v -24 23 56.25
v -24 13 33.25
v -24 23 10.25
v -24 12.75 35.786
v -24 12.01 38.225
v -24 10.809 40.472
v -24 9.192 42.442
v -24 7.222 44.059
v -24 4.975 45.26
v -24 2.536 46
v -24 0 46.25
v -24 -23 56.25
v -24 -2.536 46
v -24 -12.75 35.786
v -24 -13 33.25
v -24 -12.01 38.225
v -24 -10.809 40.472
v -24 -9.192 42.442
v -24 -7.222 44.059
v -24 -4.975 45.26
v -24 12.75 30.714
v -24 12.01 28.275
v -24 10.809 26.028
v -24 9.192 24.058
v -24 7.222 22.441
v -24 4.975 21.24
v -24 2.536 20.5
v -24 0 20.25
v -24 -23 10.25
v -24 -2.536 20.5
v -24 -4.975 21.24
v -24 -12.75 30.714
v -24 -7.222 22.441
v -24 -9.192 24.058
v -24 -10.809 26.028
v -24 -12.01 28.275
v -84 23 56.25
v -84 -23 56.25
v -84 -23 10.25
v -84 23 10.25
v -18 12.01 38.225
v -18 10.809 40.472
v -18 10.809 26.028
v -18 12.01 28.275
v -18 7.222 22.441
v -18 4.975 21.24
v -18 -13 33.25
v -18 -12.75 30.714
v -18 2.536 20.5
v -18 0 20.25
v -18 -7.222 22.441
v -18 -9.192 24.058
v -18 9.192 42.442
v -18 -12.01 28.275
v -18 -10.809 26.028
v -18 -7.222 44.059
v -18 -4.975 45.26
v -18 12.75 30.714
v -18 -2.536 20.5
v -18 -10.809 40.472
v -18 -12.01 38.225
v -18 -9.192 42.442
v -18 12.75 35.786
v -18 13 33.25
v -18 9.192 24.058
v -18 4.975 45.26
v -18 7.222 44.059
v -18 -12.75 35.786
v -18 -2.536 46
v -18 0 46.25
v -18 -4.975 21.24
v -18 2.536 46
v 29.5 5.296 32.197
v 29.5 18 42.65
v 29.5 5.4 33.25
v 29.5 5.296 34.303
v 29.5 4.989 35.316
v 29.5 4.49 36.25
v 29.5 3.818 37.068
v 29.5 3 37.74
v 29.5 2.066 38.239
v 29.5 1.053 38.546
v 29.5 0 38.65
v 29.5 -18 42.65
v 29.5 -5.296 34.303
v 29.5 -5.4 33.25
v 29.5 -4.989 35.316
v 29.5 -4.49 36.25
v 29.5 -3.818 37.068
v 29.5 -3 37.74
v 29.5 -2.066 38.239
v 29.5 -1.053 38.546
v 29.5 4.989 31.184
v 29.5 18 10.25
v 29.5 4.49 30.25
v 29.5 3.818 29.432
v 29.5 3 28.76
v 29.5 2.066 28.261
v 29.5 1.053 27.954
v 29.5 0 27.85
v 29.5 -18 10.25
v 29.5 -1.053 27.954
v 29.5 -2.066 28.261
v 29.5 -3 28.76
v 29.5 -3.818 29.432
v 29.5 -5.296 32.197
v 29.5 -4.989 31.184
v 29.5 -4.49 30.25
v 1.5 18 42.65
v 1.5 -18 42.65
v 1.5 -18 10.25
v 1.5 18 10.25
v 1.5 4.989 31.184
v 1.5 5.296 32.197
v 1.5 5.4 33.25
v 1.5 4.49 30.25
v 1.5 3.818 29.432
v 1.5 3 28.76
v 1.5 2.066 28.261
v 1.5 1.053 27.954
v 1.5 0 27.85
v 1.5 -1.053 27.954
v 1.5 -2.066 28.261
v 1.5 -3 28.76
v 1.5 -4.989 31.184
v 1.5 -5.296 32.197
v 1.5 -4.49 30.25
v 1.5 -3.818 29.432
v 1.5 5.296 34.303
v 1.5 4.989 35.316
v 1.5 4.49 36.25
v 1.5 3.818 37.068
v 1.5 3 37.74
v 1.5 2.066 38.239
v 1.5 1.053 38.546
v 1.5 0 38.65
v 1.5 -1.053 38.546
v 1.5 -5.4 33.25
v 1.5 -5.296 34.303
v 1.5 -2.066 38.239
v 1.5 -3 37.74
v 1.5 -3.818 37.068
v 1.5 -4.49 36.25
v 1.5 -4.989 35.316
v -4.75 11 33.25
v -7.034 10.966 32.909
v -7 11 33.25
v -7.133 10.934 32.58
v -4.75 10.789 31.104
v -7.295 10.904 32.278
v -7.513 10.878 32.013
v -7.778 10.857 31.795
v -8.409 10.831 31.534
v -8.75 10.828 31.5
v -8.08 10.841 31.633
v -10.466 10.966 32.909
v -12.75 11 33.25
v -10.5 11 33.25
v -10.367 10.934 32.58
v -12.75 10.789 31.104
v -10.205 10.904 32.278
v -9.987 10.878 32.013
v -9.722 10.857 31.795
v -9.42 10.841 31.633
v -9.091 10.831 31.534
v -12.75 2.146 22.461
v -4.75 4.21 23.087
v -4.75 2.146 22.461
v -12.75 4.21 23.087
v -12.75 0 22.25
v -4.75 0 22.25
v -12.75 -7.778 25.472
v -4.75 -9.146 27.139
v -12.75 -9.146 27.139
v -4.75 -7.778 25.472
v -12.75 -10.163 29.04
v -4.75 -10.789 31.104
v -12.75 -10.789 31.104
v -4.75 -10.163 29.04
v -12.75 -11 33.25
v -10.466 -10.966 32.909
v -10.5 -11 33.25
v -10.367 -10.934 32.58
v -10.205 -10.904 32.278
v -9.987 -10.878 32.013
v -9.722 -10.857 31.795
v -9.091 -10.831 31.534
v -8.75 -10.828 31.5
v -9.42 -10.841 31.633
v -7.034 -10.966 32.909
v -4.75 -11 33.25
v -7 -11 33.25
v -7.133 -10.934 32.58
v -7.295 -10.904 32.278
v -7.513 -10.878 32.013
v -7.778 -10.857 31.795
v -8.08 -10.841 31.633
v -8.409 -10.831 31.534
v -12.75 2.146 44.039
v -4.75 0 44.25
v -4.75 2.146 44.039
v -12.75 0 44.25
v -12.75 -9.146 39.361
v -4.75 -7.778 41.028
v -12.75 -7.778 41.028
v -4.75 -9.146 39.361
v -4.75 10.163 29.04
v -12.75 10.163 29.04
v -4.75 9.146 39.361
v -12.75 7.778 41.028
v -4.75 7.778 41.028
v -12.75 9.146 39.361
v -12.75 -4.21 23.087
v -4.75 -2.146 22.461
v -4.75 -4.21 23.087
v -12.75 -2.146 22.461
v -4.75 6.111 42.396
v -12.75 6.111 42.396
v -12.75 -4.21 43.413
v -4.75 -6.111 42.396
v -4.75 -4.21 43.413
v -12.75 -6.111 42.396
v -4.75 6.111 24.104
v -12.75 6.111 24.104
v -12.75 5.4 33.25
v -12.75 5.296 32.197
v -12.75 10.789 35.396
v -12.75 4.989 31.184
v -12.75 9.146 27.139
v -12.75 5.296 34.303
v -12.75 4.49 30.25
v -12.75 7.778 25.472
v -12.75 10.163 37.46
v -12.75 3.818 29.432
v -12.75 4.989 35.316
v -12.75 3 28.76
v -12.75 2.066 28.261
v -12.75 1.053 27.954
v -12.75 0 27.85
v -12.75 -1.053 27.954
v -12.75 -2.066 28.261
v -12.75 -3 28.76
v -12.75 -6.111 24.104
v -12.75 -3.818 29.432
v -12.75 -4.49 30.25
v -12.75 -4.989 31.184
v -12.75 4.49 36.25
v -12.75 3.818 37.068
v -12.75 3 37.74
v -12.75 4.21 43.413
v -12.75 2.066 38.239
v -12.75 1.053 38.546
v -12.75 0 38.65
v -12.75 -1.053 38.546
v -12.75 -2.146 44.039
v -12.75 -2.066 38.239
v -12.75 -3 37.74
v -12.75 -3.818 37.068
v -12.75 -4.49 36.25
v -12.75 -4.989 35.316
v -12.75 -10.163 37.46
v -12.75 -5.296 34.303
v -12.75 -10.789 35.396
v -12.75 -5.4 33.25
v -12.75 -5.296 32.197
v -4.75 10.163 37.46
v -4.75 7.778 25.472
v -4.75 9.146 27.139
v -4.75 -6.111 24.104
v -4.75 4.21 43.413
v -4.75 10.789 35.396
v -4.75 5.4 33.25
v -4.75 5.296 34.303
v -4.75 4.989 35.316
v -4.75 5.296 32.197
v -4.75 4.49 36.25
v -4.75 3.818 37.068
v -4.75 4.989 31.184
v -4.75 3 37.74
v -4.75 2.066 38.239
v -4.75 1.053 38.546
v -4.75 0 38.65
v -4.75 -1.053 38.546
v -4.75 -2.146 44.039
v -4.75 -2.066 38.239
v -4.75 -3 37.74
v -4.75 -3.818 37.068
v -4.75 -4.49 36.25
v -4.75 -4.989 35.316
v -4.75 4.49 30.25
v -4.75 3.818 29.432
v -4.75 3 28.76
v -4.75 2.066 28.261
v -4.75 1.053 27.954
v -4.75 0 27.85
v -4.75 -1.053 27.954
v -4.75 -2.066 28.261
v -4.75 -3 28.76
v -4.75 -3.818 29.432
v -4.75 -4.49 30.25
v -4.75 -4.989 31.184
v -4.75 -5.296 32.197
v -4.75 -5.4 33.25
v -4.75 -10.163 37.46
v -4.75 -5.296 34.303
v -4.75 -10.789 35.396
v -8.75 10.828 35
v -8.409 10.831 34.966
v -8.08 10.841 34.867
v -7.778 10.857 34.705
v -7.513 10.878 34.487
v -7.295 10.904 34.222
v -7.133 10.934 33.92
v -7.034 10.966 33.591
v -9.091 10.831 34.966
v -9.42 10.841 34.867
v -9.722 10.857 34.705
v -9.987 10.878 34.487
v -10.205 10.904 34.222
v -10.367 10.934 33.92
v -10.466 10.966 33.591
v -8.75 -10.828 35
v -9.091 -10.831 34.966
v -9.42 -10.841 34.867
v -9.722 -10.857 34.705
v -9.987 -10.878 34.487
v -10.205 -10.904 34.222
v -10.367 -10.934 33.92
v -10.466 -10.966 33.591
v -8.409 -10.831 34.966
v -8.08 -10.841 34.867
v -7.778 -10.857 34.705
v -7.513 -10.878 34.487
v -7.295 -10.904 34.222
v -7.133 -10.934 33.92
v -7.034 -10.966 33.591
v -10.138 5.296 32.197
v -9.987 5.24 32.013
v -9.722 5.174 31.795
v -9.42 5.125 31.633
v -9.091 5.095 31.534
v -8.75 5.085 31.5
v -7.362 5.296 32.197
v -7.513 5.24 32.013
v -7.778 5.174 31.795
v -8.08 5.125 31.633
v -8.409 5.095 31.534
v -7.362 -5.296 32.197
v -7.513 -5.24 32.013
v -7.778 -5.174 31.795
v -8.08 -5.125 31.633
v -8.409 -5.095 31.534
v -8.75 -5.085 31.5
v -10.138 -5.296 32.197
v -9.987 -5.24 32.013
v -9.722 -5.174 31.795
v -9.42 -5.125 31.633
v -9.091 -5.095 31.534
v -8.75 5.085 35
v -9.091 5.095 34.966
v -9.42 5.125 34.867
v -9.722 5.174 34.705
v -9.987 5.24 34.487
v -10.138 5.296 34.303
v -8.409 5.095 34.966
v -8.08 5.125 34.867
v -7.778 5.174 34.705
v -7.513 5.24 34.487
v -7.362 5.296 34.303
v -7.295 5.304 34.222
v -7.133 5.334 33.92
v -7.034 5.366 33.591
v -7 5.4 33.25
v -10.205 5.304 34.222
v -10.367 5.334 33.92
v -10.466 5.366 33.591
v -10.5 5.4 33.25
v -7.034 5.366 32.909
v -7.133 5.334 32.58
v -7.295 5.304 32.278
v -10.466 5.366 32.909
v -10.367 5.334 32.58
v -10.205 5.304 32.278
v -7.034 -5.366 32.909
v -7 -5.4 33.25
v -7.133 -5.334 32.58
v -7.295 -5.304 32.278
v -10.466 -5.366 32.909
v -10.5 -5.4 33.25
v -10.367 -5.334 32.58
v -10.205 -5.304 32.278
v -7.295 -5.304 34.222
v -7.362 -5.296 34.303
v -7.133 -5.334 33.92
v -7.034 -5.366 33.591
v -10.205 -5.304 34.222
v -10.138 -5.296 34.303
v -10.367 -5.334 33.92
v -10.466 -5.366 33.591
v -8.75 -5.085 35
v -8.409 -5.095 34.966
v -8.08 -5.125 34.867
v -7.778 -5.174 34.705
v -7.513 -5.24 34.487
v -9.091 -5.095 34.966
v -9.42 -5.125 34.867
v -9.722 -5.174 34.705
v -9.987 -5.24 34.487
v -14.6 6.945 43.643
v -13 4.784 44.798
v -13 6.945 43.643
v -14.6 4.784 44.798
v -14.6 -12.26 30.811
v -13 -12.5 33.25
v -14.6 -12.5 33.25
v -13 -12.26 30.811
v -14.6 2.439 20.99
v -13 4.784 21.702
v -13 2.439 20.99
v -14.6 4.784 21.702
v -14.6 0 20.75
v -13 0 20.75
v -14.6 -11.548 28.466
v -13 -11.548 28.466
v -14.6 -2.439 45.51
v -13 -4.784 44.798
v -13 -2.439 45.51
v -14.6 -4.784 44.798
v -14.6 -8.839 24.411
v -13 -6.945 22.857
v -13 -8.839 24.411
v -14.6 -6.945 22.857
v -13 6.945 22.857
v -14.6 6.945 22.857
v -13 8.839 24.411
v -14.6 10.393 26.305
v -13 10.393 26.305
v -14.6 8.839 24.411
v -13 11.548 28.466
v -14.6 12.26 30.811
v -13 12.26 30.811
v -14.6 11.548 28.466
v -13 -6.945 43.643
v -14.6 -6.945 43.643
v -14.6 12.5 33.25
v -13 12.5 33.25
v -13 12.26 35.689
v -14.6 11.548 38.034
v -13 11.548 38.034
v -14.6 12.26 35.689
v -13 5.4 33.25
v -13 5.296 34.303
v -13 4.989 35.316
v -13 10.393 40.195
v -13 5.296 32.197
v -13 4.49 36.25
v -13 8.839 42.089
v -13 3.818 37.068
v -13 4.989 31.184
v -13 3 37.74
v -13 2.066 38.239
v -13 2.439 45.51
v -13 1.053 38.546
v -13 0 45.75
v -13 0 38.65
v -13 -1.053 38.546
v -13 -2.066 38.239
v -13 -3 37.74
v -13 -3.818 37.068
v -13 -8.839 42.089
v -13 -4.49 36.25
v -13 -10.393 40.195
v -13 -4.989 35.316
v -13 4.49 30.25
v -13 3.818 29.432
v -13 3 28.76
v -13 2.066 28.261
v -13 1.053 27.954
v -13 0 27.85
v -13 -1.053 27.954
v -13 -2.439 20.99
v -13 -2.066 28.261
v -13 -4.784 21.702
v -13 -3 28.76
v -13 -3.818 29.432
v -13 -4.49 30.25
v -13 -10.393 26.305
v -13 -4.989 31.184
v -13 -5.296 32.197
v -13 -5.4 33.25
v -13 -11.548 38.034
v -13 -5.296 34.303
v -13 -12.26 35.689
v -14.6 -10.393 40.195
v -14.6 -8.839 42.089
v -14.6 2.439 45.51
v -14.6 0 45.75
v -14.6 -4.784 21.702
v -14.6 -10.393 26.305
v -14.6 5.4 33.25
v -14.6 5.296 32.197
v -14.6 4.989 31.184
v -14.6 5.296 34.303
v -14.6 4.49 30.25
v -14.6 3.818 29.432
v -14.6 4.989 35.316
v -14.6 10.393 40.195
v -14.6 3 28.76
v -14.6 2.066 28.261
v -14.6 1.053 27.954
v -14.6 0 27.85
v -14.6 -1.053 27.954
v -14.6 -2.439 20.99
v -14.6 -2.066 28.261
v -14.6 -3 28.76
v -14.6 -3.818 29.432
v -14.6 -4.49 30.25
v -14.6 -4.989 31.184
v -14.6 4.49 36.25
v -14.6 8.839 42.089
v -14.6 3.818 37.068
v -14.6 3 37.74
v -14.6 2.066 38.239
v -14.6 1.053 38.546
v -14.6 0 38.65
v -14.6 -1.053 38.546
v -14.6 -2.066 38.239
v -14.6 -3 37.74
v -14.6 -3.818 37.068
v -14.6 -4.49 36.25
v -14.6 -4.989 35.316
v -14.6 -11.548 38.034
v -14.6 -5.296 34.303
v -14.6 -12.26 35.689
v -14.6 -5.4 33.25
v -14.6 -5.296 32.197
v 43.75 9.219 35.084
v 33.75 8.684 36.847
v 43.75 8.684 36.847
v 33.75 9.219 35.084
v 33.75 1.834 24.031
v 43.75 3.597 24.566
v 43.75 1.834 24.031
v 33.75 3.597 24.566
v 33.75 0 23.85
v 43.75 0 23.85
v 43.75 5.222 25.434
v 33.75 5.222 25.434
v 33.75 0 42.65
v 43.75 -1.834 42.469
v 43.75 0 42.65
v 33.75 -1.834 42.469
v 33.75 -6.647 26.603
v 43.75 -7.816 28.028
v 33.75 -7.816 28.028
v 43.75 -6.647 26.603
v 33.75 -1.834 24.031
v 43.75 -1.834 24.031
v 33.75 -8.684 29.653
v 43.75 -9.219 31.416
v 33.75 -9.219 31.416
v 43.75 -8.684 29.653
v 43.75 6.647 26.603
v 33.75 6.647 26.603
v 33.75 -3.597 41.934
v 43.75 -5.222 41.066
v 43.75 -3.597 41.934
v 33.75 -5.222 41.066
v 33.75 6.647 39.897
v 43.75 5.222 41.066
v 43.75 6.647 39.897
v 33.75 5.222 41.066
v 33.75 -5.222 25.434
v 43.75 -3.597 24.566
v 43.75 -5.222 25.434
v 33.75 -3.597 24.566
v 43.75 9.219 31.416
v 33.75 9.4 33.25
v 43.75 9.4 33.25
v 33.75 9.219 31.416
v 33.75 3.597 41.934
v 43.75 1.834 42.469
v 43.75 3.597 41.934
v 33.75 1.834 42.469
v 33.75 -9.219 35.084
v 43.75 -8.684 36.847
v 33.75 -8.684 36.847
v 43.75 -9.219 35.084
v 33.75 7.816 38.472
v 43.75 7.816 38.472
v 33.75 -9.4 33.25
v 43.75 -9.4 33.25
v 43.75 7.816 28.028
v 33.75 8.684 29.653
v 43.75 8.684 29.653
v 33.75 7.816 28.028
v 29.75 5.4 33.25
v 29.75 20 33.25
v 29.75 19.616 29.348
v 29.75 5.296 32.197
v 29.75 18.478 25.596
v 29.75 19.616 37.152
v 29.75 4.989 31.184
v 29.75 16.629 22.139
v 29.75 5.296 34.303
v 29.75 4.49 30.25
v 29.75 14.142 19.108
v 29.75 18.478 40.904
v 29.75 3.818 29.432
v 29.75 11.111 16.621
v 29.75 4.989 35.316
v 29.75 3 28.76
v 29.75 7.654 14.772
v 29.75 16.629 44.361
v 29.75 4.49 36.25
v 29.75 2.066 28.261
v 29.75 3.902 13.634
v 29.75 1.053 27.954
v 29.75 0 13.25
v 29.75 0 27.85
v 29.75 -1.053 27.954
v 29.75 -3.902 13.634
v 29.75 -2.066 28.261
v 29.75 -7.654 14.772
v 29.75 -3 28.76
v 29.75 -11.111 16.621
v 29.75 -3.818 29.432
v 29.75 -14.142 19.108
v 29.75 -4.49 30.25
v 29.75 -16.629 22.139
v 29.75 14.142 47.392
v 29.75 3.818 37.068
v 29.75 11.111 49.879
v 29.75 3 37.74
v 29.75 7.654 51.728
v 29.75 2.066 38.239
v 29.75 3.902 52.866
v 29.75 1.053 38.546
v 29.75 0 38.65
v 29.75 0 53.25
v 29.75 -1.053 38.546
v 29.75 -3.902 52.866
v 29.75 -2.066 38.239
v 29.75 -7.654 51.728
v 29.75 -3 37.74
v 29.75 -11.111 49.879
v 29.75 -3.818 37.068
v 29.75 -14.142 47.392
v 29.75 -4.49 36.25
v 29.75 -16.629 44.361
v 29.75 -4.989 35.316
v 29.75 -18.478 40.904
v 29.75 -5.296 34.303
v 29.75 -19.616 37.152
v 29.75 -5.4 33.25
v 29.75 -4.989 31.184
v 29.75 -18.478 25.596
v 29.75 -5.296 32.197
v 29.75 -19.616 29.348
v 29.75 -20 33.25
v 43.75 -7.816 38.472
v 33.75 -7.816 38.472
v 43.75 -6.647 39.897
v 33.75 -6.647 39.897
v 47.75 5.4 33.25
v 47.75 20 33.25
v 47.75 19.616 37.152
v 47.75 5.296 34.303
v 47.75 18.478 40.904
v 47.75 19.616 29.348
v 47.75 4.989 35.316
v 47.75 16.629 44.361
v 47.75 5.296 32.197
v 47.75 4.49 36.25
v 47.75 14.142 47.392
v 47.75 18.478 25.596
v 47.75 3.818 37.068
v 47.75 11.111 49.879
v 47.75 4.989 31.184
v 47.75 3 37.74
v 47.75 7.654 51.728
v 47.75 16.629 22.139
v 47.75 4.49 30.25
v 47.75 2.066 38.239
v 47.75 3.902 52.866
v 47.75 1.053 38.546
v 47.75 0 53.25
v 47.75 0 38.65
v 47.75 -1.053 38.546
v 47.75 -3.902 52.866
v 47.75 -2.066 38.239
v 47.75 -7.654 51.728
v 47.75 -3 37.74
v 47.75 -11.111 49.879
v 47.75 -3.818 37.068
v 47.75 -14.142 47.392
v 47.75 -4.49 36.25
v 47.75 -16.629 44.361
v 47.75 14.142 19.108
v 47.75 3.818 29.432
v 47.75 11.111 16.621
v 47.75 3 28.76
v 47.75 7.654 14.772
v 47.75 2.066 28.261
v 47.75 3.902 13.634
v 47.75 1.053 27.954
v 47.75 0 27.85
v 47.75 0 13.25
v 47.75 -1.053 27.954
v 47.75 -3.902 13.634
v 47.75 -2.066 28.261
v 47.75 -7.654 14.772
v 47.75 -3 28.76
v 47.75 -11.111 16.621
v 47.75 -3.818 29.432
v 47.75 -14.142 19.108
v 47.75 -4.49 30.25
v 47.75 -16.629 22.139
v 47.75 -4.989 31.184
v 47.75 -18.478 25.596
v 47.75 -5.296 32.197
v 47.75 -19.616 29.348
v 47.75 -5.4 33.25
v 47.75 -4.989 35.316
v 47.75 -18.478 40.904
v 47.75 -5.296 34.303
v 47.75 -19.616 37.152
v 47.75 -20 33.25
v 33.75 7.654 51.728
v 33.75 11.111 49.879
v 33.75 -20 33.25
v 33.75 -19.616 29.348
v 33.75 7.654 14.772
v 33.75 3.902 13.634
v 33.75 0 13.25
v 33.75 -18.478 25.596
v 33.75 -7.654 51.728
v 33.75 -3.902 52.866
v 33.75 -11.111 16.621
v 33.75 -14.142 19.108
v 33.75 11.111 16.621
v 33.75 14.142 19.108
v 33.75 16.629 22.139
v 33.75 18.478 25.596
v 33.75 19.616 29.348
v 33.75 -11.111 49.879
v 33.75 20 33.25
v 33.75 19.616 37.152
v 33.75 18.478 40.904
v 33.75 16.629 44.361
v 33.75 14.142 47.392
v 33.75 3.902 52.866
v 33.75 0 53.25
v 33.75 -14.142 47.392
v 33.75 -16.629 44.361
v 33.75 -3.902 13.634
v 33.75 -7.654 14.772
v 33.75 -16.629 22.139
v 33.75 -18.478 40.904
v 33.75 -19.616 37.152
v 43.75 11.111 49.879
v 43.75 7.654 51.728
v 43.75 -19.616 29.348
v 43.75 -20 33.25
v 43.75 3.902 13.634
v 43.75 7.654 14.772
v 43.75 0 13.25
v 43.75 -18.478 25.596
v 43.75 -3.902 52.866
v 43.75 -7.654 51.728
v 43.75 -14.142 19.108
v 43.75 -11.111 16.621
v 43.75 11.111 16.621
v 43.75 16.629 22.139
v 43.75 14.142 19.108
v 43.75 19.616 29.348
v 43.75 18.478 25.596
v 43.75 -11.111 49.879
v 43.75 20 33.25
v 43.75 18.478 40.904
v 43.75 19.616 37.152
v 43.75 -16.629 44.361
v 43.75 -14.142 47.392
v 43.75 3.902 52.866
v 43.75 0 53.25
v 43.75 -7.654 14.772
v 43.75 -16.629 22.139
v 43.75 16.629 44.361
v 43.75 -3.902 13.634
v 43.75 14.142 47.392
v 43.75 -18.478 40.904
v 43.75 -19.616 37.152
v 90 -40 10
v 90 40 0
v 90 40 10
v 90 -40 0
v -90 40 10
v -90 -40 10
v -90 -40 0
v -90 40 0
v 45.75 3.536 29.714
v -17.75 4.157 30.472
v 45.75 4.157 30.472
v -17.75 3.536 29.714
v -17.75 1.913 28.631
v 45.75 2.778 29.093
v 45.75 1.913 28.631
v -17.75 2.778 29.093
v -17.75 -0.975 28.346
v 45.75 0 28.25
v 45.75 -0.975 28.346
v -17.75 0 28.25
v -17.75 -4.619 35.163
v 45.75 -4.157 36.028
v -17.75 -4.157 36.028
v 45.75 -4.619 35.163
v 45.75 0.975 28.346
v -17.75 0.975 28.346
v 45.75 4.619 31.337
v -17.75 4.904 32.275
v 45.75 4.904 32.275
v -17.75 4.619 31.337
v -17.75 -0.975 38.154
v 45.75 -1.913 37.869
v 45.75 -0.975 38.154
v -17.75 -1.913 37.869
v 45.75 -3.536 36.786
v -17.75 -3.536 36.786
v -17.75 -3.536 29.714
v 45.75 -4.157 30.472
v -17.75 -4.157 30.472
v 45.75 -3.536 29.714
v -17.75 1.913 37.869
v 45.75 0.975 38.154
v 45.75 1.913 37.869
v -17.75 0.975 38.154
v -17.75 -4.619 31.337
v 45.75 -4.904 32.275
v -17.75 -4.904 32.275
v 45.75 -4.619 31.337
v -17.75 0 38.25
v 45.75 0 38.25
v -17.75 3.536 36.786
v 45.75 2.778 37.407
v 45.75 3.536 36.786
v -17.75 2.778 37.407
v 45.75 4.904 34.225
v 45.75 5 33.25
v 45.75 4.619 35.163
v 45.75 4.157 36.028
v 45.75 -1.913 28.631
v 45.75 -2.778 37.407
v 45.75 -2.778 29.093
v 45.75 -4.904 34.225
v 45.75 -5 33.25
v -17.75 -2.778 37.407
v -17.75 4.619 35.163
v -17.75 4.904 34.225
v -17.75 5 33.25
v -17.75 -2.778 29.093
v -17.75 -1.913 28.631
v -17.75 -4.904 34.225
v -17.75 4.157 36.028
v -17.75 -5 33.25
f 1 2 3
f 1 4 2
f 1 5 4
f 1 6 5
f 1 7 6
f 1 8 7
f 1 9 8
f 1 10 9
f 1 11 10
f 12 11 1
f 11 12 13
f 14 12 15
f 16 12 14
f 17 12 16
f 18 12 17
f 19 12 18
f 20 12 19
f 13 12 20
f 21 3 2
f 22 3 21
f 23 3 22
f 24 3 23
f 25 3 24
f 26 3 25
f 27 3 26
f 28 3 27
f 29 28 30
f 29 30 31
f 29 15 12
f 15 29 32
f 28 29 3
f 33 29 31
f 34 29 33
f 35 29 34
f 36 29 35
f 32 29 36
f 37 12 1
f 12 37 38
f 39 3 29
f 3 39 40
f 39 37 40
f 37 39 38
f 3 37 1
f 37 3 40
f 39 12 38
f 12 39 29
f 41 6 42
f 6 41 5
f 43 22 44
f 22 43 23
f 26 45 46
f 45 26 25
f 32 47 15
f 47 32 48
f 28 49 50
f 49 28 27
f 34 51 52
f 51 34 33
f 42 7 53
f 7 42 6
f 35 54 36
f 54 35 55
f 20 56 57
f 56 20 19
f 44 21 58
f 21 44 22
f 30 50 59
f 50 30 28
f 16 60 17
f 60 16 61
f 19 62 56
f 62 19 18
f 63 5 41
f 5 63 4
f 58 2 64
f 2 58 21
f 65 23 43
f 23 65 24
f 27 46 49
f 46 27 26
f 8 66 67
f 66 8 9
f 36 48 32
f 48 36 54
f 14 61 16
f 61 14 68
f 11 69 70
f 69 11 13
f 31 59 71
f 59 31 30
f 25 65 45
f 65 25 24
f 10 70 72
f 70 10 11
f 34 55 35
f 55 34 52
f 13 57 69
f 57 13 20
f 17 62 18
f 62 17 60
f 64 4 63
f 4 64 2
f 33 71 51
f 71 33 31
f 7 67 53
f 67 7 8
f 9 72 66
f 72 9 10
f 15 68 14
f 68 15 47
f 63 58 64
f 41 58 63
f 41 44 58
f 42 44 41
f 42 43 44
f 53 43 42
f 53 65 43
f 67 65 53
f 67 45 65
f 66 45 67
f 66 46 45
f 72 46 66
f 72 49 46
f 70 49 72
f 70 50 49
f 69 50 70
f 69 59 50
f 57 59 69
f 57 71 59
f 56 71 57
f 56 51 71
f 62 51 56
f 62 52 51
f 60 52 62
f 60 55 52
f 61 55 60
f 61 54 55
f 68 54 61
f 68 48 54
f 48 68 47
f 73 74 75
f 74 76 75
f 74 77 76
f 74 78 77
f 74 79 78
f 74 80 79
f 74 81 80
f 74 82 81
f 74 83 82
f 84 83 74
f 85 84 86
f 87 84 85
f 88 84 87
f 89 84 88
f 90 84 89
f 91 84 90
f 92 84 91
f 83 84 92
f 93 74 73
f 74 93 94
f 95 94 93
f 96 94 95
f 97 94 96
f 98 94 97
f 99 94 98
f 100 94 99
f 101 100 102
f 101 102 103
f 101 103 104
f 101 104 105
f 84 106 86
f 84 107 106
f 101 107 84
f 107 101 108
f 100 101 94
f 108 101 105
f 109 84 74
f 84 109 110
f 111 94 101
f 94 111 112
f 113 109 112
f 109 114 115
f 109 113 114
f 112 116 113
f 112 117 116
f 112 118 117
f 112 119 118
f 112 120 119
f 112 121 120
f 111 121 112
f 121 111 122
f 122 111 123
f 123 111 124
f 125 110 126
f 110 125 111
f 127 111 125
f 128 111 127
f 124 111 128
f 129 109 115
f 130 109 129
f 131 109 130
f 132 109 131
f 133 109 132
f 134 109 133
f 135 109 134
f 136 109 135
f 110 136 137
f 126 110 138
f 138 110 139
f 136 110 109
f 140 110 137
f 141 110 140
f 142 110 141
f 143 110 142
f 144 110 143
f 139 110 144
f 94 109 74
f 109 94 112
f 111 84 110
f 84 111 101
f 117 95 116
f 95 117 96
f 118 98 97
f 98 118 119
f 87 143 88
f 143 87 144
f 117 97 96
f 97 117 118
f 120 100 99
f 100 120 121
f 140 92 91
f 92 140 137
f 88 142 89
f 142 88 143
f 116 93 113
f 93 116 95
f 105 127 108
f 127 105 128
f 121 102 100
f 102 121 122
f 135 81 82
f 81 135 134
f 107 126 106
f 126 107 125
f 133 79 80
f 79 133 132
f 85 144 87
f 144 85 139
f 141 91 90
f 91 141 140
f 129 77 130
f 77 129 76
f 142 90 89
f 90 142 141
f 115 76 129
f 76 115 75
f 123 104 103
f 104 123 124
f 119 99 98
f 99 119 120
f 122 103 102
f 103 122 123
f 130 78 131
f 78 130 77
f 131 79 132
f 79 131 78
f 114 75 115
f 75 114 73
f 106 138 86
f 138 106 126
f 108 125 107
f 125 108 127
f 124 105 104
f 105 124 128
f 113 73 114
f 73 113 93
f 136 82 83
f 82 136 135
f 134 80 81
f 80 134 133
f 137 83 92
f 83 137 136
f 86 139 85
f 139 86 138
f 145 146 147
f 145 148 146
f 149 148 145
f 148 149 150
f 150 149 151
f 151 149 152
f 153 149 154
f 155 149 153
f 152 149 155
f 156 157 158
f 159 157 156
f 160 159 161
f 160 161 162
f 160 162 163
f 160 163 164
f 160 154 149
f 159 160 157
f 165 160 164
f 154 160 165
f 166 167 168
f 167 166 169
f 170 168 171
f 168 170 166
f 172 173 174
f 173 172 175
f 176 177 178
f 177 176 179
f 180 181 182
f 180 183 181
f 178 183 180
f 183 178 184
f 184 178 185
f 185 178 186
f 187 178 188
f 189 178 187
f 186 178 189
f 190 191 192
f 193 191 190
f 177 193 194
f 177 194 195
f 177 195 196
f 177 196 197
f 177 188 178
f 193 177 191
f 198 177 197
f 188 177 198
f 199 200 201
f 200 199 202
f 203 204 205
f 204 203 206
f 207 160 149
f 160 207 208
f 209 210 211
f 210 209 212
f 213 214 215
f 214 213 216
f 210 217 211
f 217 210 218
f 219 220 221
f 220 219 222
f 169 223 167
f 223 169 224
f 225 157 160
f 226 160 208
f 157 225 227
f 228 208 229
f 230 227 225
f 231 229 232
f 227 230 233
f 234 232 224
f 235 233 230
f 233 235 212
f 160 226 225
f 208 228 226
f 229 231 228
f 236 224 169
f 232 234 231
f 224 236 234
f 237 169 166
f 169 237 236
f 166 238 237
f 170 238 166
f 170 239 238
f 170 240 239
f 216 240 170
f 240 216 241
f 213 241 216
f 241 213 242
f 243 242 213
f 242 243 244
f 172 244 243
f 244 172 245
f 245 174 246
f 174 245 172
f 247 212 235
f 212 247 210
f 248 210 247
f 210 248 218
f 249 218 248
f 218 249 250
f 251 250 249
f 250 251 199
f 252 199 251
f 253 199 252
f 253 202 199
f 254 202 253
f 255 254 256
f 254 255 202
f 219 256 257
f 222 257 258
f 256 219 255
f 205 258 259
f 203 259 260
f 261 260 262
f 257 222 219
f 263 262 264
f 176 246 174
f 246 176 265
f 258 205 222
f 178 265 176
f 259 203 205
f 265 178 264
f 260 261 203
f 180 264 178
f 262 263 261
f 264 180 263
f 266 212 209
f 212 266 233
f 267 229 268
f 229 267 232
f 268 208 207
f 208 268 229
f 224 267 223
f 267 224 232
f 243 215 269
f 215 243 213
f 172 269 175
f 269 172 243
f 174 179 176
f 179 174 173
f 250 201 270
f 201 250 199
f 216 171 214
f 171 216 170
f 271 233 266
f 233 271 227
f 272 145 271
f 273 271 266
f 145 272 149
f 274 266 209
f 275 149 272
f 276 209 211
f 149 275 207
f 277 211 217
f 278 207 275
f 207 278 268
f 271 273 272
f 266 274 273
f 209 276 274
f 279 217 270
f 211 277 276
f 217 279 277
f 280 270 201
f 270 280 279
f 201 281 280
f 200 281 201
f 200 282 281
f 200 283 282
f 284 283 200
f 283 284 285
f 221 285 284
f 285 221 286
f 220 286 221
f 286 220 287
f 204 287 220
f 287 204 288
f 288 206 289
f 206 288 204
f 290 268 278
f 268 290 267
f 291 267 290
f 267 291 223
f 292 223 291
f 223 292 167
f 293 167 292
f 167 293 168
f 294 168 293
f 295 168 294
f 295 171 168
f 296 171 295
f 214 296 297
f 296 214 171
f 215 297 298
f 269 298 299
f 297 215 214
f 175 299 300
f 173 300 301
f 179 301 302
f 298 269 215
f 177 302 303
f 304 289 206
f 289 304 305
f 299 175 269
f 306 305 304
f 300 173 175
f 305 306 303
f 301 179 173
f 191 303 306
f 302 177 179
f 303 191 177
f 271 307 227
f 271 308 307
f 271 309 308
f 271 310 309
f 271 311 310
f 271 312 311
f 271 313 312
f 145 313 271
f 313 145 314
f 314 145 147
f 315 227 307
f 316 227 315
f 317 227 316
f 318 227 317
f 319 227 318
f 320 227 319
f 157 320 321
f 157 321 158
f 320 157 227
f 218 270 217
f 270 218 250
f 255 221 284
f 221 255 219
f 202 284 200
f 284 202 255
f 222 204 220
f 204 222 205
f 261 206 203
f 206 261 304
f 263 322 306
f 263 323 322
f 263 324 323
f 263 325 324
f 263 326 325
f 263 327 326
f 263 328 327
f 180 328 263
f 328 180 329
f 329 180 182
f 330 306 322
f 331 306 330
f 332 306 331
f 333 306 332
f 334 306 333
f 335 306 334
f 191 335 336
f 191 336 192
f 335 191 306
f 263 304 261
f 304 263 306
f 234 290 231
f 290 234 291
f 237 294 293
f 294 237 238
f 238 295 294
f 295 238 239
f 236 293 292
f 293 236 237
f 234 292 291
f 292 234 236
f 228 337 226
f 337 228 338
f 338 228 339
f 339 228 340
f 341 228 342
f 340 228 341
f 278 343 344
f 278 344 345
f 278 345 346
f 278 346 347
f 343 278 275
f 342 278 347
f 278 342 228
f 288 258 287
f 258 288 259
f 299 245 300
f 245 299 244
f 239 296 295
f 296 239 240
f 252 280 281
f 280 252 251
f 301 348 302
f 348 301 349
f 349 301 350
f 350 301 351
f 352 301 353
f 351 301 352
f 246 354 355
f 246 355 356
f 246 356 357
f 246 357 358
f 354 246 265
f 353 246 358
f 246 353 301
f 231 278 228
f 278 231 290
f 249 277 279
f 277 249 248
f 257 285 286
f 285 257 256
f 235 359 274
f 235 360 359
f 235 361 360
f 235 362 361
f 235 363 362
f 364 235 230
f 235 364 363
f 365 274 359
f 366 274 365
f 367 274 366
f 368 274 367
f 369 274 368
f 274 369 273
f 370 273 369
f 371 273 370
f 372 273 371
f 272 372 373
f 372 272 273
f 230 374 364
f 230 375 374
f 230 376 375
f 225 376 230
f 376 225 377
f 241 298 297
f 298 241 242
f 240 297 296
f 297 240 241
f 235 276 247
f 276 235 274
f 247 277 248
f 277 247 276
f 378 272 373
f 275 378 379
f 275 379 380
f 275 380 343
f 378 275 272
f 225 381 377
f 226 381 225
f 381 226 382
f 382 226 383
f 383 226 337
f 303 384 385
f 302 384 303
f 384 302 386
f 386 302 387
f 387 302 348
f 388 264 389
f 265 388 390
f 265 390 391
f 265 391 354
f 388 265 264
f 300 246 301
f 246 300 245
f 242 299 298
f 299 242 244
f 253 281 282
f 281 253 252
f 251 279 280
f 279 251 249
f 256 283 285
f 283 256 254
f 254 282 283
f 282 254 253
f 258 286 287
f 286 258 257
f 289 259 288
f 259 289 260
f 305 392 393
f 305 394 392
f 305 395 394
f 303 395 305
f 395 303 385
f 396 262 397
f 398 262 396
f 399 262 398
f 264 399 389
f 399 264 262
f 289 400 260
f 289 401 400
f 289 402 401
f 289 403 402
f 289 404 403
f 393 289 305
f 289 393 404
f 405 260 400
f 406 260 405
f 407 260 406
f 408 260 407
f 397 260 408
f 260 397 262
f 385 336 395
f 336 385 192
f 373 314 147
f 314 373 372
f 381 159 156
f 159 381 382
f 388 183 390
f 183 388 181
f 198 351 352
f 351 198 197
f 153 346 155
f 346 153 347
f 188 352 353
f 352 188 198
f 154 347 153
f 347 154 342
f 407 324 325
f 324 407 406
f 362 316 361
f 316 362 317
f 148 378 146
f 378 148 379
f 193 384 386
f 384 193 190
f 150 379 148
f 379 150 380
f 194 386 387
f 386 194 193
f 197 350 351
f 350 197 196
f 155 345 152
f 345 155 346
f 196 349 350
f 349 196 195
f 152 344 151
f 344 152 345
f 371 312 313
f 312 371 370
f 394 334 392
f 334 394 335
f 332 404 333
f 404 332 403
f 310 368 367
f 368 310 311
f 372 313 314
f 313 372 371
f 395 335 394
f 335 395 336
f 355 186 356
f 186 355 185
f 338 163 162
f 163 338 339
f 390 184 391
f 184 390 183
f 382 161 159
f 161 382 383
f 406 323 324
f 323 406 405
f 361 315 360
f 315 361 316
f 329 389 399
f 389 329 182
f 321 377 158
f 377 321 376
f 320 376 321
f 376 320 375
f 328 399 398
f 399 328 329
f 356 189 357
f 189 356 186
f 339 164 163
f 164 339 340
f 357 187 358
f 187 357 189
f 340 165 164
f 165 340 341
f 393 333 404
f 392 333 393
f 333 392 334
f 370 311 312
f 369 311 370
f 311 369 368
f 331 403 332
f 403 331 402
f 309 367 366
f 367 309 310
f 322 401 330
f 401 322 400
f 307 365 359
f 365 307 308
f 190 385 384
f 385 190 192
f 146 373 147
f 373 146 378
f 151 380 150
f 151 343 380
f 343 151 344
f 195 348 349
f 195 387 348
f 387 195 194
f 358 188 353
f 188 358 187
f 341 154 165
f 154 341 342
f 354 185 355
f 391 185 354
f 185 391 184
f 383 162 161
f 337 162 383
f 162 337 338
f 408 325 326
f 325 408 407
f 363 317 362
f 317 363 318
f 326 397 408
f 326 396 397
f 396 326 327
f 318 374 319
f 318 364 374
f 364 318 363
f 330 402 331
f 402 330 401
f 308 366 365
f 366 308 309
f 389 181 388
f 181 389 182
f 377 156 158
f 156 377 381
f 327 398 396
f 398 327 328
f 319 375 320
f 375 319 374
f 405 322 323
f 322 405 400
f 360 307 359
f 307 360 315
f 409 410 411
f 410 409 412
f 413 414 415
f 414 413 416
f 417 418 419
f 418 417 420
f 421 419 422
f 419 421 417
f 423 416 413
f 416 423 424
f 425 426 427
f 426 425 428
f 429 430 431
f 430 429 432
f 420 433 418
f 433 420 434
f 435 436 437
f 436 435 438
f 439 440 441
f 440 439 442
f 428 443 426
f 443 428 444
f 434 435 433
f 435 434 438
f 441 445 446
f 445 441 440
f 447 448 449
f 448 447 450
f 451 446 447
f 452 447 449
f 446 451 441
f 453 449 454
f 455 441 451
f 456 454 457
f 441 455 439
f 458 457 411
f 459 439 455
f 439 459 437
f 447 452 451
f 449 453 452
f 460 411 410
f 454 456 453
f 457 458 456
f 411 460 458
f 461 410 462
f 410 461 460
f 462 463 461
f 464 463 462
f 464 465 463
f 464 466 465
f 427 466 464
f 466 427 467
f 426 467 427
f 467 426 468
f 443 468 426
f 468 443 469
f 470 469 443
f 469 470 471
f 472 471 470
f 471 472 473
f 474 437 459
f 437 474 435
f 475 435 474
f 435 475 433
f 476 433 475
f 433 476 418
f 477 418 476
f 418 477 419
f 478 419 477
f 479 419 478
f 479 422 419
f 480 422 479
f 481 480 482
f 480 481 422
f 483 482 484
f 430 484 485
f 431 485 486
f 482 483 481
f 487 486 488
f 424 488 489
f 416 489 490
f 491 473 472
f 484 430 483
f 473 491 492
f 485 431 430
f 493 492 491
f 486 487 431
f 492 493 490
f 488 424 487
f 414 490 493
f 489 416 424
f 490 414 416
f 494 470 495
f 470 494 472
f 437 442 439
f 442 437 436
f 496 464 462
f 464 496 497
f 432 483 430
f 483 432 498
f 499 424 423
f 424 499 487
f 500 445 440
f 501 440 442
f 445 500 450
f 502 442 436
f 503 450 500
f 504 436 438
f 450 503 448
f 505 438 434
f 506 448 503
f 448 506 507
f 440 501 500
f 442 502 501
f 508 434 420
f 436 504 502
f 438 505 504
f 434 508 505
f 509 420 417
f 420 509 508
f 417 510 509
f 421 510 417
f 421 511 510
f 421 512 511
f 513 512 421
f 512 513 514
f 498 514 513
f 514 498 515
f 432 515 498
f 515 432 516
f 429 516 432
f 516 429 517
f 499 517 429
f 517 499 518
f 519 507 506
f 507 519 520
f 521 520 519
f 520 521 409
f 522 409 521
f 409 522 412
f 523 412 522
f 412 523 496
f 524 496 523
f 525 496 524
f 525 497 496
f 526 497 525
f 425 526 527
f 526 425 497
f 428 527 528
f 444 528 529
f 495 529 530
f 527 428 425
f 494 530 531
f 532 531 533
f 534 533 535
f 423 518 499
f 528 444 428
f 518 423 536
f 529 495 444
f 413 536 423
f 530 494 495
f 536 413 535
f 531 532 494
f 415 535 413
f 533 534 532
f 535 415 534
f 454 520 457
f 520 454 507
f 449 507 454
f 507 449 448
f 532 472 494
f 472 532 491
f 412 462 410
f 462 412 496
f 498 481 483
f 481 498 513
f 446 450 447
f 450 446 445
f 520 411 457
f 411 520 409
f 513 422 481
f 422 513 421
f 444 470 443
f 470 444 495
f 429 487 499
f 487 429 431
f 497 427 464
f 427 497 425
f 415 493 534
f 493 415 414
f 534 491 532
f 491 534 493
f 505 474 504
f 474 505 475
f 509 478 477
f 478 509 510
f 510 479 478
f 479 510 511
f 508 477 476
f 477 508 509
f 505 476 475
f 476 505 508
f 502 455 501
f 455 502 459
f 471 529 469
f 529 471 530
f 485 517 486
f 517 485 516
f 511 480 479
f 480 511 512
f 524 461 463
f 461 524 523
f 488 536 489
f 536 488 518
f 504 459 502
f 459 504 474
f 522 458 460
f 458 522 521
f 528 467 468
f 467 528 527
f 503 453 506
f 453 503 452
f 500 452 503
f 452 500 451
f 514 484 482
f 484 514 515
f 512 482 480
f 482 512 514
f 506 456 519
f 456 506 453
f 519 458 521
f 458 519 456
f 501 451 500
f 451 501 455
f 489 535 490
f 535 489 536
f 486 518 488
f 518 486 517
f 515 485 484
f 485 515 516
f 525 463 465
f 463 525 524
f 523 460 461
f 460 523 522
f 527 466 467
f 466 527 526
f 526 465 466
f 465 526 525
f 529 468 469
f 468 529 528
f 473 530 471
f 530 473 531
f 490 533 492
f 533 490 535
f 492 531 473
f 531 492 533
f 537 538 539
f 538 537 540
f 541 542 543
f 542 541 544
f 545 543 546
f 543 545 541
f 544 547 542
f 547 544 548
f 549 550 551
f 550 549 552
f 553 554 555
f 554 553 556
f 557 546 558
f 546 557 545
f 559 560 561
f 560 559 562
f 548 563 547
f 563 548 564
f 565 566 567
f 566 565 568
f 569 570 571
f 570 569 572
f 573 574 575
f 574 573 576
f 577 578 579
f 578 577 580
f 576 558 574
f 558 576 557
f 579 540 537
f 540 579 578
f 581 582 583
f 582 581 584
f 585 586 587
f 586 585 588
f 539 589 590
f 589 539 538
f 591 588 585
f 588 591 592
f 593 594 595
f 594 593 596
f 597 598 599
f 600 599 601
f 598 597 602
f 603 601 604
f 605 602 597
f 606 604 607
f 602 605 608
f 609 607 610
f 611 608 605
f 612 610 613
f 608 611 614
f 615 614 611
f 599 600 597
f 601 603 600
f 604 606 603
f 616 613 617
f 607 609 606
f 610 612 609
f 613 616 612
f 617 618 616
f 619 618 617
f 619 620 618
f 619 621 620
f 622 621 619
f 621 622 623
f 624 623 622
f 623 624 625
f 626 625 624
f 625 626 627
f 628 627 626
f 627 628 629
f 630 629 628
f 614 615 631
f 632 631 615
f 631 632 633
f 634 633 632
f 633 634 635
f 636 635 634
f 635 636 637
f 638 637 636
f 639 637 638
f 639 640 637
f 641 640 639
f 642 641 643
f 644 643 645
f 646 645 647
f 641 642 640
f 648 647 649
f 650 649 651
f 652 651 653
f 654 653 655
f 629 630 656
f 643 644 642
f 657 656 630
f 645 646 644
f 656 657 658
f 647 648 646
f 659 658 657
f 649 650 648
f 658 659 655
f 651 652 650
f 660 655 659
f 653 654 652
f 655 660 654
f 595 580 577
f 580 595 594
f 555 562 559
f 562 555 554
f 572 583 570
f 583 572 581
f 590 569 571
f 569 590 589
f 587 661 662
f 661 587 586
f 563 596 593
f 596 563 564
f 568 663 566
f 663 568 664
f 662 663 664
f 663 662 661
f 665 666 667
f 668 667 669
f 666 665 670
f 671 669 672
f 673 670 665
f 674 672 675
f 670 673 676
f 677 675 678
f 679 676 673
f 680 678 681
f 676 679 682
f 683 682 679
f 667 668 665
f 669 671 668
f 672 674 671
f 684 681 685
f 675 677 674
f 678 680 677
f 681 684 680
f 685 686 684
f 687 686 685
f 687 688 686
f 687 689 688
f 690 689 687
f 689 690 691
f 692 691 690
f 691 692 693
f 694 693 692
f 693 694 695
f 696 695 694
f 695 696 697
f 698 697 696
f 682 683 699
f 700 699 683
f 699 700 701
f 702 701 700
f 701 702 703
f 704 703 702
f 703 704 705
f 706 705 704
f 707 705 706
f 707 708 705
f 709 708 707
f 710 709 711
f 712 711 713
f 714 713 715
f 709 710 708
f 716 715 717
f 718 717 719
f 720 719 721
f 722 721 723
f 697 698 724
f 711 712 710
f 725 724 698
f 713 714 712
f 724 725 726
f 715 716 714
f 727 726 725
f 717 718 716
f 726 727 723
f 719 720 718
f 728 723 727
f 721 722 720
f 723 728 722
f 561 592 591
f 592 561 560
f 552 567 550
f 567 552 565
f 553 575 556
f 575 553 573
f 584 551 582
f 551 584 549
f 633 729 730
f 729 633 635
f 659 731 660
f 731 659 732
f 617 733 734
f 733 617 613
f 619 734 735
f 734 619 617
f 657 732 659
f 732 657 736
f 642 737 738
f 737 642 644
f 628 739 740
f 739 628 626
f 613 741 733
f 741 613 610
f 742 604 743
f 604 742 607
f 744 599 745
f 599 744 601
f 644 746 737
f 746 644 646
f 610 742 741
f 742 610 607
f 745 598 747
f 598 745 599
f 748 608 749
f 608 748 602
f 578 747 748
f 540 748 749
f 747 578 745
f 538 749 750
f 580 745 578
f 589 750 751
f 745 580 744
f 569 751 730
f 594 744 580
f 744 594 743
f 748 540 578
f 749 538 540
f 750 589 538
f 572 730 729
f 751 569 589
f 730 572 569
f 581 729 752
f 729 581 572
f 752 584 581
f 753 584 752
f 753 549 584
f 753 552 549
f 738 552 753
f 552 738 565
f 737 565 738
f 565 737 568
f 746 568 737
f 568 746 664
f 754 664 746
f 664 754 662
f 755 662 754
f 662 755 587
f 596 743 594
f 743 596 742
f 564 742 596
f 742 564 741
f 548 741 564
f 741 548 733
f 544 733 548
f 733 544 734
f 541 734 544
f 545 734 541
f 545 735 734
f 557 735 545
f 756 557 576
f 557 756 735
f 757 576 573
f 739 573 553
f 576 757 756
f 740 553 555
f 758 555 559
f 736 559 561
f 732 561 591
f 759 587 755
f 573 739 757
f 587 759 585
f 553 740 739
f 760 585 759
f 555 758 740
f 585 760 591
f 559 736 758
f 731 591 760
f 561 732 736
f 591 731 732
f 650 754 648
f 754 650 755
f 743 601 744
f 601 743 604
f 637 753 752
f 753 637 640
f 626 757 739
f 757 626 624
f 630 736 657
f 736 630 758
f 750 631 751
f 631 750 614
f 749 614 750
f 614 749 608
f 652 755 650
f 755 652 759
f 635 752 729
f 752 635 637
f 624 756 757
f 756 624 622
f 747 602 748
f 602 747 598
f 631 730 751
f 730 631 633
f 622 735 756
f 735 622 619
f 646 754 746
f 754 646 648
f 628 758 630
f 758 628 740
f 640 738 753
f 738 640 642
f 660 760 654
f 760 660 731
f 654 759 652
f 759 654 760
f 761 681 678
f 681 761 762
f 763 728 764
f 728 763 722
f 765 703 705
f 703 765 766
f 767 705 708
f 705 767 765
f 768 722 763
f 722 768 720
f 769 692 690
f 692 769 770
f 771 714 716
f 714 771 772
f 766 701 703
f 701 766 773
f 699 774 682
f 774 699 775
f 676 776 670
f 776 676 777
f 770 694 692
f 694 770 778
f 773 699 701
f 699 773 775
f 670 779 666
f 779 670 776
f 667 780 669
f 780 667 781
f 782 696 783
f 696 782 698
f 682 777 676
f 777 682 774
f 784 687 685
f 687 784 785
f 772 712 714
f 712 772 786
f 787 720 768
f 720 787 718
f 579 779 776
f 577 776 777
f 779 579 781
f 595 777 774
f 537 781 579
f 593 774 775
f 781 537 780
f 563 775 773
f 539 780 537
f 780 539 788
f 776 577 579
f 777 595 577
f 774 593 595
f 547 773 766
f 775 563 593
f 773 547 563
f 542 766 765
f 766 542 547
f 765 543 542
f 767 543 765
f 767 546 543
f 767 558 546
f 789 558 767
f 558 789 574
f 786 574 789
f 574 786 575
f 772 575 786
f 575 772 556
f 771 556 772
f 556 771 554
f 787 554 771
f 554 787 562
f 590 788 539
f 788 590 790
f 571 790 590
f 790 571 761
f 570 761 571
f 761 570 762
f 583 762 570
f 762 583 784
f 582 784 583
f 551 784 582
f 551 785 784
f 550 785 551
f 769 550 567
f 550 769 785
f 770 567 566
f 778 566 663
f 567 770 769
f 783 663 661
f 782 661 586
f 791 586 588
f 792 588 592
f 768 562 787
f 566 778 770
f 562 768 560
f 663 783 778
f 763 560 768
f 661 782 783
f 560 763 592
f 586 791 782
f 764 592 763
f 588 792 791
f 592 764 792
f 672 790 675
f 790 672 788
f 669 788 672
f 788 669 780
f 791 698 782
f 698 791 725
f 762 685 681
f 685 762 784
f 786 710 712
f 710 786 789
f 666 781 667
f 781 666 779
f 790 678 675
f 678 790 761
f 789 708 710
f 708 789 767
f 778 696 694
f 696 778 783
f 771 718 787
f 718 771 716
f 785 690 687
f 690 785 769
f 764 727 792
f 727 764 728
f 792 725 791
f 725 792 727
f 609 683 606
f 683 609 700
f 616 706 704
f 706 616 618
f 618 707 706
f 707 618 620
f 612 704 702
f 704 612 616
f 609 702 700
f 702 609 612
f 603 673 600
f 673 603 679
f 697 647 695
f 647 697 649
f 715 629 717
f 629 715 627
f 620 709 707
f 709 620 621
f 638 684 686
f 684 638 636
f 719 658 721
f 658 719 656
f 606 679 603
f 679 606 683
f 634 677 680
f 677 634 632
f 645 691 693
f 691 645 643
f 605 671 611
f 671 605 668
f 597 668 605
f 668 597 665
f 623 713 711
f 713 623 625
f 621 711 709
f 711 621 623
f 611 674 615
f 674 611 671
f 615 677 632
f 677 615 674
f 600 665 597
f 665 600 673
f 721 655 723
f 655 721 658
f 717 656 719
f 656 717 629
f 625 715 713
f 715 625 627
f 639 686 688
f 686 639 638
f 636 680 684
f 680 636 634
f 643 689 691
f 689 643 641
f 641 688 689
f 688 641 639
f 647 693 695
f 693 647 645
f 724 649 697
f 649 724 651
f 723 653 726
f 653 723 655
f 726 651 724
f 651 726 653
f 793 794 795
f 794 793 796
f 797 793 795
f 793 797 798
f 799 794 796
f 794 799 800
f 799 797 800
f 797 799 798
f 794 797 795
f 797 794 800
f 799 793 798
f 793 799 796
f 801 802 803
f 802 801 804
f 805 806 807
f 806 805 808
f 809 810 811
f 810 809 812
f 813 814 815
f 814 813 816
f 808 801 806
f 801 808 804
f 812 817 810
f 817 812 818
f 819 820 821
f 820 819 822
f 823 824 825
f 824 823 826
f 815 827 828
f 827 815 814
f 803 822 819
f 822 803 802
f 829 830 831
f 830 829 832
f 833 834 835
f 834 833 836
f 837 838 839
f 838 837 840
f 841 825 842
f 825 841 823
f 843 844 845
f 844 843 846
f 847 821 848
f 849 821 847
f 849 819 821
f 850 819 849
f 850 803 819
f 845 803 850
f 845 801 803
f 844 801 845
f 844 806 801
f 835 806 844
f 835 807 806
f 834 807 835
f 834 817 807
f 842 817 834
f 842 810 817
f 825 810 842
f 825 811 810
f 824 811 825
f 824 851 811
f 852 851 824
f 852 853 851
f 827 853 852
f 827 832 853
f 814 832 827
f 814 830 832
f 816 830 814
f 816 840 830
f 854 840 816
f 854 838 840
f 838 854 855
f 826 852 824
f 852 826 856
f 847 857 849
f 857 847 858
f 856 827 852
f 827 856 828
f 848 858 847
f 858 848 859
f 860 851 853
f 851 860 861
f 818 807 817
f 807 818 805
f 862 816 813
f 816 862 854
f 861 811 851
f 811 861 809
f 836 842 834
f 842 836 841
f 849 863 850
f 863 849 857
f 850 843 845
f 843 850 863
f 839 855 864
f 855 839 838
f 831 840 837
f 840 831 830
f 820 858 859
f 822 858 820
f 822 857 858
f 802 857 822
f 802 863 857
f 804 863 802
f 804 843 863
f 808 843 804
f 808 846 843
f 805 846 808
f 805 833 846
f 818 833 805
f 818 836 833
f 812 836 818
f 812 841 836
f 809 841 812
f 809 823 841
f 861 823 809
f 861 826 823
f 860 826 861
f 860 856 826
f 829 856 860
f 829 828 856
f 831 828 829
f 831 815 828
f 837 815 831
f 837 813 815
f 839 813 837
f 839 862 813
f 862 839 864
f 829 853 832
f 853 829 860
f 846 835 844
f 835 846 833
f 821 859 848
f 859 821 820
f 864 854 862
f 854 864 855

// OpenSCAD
$fn = 32;

// ------------------------------------------------------------------------
// Motor drive station: motor 60 x 46 mm, shaft d10, pulley d40
// Every part is its own module, assembly() places every instance.
// ------------------------------------------------------------------------

// --- part 1 ---
module station_bed() {
  difference() {
    translate([-90, -40, 0]) cube([180, 80, 10]);
  }
}

// --- part 2 ---
module drive_motor() {
  union() {
    translate([-30, -23, 0]) cube([60, 46, 46]);
    translate([33, 0, 23]) rotate([0, 90, 0]) cylinder(h = 6, d = 26, center = true);
  }
}

// --- part 3 ---
module pillow_block() {
  difference() {
    translate([-14, -18, 0]) cube([28, 36, 32.4]);
    translate([0, 0, 23]) rotate([0, 90, 0]) cylinder(h = 30, d = 10.8, center = true);
  }
}

// --- part 4 ---
module drive_shaft() {
  translate([0, 0, -31.75]) cylinder(h = 63.5, d = 10);
}

// --- part 5 ---
module shaft_collar() {
  difference() {
    cylinder(h = 8, d = 22);
    translate([0, 0, -1]) cylinder(h = 10, d = 10.8);
    translate([0, 0, 4]) rotate([90, 0, 0]) cylinder(h = 24, d = 3.5, center = true);
  }
}

// --- part 6 ---
module collar_washer() {
  difference() {
      translate([0, 0, 0]) cylinder(h = 1.6, d = 25);
      translate([0, 0, -1]) cylinder(h = 3.6, d = 10.8);
    }
}

// --- part 7 ---
module drive_pulley() {
  difference() {
    union() {
      cylinder(h = 18, d = 18.8);
      cylinder(h = 4, d = 40);
      translate([0, 0, 14]) cylinder(h = 4, d = 40);
    }
    translate([0, 0, -1]) cylinder(h = 20, d = 10.8);
  }
}

// --- assembly ---
module assembly() {
  color([0.80, 0.24, 0.20]) translate([0, 0, 0]) rotate([0, 0, 0]) station_bed();
  color([0.20, 0.45, 0.75]) translate([-54, 0, 10.25]) rotate([0, 0, 0]) drive_motor();
  color([0.25, 0.62, 0.32]) translate([15.5, 0, 10.25]) rotate([0, 0, 0]) pillow_block();
  color([0.92, 0.70, 0.18]) translate([14, 0, 33.25]) rotate([0, 90, 0]) drive_shaft();
  color([0.58, 0.35, 0.70]) translate([-12.75, 0, 33.25]) rotate([0, 90, 0]) shaft_collar();
  color([0.16, 0.66, 0.66]) translate([-14.6, 0, 33.25]) rotate([0, 90, 0]) collar_washer();
  color([0.85, 0.48, 0.18]) translate([29.75, 0, 33.25]) rotate([0, 90, 0]) drive_pulley();
}

assembly();
